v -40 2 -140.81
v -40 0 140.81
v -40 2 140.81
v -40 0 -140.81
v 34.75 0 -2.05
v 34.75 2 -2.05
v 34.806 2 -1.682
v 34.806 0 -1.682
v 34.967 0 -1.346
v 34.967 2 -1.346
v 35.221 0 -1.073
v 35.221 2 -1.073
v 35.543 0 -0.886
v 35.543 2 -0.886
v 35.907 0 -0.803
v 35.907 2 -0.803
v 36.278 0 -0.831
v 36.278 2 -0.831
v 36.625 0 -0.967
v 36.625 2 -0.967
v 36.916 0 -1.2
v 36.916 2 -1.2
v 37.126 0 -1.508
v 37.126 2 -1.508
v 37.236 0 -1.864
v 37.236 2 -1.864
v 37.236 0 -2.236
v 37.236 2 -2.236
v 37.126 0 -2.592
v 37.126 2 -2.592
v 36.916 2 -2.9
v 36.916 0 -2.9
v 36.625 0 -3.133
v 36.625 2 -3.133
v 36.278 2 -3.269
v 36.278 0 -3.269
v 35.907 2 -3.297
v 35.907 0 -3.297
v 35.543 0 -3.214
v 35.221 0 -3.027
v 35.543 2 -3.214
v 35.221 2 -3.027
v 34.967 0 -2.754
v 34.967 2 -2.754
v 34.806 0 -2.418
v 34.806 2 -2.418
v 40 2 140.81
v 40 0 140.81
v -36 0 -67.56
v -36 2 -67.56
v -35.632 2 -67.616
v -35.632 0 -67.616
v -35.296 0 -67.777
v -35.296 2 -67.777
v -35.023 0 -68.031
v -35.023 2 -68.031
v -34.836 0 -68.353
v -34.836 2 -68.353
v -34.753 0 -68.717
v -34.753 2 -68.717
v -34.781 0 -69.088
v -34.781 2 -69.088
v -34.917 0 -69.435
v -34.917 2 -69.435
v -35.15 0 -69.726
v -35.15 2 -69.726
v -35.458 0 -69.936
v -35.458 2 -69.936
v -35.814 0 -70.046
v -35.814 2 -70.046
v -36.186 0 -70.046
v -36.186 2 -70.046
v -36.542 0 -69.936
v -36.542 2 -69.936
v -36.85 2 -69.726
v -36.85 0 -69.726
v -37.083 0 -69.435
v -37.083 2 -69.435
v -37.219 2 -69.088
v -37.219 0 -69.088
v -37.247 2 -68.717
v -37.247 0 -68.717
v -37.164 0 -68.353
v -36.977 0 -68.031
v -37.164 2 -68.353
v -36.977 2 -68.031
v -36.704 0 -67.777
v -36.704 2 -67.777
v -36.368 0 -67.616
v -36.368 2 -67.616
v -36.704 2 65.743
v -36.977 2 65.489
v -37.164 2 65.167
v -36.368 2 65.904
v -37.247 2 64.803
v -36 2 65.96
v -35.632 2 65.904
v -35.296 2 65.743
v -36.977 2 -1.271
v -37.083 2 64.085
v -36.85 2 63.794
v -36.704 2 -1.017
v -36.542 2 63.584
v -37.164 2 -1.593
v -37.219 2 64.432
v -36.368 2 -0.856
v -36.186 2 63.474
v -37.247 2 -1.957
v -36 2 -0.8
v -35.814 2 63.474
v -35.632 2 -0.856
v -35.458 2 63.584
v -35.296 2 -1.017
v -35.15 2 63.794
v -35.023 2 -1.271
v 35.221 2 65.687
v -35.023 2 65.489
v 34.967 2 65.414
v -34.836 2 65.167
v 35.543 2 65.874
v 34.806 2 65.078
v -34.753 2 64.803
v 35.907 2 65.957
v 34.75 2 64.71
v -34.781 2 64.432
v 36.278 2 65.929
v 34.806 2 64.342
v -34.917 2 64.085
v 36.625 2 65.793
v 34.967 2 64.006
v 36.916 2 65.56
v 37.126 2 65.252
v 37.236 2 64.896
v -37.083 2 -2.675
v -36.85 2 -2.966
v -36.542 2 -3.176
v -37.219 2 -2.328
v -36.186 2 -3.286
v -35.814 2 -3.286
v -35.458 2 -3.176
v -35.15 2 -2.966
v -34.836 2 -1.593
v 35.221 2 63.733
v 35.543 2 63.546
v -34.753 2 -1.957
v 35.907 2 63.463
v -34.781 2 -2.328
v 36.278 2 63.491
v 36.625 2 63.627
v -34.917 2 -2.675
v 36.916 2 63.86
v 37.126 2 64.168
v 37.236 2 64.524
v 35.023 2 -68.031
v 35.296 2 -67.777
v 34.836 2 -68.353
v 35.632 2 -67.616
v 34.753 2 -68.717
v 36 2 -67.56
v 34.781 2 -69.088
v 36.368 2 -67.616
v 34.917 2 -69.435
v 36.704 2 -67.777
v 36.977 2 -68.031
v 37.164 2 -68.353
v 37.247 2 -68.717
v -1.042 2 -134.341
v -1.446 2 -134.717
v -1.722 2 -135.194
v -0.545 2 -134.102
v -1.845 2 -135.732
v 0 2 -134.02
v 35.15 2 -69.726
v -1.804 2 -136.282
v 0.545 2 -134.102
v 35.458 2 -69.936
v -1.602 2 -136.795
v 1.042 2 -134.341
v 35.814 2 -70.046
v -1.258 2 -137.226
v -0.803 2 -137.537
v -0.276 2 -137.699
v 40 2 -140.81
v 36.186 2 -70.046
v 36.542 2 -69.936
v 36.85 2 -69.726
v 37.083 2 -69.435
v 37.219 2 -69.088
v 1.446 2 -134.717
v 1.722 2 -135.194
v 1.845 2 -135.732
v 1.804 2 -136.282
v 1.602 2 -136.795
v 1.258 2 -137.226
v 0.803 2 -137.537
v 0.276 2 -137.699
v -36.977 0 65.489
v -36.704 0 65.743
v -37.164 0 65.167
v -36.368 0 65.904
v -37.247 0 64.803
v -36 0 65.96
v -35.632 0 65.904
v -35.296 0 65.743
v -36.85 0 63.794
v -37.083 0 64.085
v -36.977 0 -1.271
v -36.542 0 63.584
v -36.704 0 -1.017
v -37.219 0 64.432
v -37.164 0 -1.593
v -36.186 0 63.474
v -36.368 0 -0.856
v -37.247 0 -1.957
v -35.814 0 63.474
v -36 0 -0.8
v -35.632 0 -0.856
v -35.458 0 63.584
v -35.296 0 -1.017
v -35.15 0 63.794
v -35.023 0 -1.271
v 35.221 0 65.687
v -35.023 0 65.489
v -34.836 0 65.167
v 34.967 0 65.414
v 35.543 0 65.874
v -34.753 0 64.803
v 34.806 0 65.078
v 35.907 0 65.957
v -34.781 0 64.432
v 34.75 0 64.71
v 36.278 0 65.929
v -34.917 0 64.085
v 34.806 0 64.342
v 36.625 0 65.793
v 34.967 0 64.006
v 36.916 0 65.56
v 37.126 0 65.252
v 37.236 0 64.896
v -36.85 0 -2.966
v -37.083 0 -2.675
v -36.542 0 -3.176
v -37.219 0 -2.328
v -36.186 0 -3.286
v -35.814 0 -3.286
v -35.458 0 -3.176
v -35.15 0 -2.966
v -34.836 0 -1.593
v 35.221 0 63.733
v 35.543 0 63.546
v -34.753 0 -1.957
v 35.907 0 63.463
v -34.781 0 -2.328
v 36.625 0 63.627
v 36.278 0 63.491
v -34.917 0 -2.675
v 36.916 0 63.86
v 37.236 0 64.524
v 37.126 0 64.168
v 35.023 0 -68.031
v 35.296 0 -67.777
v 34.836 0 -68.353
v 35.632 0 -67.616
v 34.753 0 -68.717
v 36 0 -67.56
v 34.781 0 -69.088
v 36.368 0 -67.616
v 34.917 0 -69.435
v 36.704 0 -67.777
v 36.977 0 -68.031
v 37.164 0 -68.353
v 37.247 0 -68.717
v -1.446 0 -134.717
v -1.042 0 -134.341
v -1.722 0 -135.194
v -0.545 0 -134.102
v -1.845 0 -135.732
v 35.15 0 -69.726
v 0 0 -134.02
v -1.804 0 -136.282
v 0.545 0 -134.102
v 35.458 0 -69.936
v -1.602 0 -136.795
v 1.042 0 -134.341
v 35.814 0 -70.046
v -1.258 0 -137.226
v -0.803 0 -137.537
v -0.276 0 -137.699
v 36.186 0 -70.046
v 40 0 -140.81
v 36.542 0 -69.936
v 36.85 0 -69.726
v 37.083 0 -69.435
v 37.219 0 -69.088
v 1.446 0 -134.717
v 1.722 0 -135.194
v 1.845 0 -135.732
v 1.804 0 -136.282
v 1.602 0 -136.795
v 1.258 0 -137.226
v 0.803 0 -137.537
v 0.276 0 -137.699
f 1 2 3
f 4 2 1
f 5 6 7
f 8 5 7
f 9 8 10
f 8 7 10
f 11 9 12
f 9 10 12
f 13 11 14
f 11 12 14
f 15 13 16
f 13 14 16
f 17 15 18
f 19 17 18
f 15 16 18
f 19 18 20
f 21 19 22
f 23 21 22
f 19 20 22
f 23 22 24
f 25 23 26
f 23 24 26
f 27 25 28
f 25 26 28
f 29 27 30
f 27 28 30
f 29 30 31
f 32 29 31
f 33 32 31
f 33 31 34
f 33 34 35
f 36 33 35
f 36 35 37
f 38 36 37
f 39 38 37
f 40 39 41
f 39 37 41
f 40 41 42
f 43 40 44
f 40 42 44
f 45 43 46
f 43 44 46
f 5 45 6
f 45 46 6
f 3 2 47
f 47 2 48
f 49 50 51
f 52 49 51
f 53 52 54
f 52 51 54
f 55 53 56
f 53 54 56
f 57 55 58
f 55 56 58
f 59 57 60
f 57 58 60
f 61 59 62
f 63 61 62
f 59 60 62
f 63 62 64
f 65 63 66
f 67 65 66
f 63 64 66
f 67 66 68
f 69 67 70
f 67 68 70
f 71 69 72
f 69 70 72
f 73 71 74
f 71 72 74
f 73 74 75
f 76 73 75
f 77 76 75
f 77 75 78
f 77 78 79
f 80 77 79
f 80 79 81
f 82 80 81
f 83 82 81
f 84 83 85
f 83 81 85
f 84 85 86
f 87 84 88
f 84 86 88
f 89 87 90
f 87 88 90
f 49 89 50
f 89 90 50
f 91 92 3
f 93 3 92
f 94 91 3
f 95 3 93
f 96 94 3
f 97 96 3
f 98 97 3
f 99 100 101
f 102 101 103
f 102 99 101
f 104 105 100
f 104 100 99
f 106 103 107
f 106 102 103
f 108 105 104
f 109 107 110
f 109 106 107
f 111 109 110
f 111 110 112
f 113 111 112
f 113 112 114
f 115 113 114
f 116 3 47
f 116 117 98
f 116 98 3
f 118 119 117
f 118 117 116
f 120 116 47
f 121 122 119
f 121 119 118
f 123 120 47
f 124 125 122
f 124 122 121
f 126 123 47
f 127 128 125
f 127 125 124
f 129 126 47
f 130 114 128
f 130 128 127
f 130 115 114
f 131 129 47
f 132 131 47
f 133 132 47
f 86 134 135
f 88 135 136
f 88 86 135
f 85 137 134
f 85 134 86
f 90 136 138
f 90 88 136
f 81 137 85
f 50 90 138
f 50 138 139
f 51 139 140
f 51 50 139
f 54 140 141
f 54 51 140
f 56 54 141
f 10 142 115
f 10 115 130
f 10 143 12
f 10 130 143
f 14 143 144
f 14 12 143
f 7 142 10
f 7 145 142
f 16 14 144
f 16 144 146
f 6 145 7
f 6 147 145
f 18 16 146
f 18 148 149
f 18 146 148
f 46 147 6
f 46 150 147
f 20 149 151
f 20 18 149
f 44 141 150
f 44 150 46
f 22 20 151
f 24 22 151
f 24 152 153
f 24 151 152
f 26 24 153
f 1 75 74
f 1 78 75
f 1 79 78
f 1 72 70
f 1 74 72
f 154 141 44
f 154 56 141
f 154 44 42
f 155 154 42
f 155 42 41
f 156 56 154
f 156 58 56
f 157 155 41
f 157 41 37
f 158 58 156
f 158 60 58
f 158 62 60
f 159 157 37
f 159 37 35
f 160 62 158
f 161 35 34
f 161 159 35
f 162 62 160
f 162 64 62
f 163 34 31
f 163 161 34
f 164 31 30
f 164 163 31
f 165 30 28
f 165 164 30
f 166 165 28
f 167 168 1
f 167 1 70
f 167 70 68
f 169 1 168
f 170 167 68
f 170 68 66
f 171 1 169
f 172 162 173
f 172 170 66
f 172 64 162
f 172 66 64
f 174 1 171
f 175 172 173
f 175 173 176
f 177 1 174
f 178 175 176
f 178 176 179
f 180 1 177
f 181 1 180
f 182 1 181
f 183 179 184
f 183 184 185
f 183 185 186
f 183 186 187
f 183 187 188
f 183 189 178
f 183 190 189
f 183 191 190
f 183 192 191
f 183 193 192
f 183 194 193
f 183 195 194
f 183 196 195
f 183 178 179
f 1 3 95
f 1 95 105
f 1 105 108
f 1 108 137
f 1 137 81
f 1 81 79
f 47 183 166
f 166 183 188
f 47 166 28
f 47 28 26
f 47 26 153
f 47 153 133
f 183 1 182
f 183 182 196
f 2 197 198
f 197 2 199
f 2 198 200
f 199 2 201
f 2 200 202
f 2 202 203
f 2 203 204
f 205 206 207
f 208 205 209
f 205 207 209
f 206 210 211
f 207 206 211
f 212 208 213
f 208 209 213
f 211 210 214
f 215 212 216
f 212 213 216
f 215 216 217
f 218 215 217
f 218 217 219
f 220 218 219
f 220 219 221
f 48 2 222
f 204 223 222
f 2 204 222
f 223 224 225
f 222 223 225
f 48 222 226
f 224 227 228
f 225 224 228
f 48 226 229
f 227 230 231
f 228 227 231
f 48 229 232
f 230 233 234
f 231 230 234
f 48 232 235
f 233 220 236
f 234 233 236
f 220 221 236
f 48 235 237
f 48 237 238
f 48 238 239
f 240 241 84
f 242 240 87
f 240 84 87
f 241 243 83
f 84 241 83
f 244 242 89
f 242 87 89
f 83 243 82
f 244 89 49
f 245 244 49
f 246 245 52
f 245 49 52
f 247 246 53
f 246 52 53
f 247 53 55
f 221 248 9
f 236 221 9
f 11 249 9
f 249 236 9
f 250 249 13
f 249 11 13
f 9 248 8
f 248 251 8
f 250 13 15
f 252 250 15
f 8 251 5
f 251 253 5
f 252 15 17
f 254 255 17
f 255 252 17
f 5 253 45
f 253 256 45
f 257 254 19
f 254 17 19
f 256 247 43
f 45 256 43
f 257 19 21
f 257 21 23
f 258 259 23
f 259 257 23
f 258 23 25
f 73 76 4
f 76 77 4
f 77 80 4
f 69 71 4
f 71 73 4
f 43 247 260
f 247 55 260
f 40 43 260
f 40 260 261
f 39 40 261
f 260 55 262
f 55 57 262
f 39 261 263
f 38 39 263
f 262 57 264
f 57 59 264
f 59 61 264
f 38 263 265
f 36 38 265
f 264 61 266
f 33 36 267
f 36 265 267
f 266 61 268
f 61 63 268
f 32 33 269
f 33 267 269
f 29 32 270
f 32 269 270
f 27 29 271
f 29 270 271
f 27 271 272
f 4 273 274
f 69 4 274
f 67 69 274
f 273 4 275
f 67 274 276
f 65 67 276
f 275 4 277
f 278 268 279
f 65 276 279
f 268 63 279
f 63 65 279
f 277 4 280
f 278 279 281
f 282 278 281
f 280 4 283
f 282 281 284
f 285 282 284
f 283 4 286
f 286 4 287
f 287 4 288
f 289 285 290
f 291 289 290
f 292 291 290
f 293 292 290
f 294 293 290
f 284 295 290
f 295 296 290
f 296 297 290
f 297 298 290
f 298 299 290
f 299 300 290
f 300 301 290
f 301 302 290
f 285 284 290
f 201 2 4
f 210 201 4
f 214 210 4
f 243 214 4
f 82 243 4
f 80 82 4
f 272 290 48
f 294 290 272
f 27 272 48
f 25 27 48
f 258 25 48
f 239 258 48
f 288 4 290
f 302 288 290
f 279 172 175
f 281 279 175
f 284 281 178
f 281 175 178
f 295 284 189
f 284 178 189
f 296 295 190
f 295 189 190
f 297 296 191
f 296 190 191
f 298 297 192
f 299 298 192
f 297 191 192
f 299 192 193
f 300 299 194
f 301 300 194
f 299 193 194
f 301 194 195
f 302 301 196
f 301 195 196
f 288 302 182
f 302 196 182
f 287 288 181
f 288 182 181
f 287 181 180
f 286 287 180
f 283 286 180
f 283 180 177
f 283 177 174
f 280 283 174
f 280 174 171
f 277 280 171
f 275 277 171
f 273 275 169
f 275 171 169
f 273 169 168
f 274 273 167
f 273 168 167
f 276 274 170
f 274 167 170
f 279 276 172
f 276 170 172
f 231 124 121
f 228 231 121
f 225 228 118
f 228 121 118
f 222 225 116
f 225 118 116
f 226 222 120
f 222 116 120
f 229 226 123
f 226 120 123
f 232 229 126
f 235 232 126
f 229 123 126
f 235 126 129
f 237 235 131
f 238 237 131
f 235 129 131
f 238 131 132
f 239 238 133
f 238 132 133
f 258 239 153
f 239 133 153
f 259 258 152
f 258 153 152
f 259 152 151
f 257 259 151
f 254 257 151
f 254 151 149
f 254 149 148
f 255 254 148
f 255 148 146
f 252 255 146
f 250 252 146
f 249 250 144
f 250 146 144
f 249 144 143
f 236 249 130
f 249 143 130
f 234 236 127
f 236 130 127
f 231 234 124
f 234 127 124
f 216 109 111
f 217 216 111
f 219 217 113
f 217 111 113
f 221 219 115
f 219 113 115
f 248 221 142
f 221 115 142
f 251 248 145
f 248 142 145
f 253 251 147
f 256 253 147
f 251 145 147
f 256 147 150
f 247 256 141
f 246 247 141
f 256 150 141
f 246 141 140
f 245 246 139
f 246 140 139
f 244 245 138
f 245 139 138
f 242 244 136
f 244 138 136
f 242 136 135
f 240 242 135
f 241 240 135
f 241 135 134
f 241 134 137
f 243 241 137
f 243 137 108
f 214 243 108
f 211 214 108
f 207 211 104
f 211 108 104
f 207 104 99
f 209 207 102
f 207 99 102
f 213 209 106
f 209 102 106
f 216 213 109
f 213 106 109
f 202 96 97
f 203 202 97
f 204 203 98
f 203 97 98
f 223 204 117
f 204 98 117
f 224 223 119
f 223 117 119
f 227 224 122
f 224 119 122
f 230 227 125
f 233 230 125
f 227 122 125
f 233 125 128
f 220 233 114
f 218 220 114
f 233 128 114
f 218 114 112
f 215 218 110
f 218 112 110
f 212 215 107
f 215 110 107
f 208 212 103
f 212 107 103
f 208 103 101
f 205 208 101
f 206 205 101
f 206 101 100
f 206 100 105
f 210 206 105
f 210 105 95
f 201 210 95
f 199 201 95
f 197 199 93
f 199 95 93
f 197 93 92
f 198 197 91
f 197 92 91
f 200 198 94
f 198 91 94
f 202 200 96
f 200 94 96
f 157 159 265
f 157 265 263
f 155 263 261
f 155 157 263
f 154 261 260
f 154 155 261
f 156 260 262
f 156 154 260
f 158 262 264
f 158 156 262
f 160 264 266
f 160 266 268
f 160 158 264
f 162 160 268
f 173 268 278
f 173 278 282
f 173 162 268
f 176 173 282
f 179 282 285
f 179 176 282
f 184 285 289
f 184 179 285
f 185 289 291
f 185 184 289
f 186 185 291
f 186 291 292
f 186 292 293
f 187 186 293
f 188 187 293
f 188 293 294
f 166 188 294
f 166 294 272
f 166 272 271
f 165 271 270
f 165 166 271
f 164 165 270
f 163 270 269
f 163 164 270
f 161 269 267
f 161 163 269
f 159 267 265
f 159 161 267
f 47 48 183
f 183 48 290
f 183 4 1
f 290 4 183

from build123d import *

# Parameters (mm, degrees)
SKETCH1_W               = 80
SKETCH1_H               = 281.62
BOSS_EXTRUDE1_DEPTH     = 2
SKETCH2_R               = 1.85
CUT_EXTRUDE1_DEPTH      = 2
SKETCH3_R               = 1.25
CUT_EXTRUDE2_DEPTH      = 2
LPATTERN1_COUNT         = 3
LPATTERN1_PITCH         = 66.76
MIRROR1_COPY_1_SKETCH_R = 1.25
MIRROR1_COPY_1_DEPTH    = 2
MIRROR1_COPY_2_SKETCH_R = 1.25
MIRROR1_COPY_2_DEPTH    = 2


with BuildPart() as part:
    # Sketch1 → Boss-Extrude1 (new body)
    with BuildSketch(Plane(origin=(0, 0, 0), x_dir=(1, 0, 0), z_dir=(0, 1, 0))):
        Rectangle(SKETCH1_W, SKETCH1_H)
    extrude(amount=BOSS_EXTRUDE1_DEPTH)

    # Sketch2 → Cut-Extrude1 (cut)
    with BuildSketch(Plane(origin=(0, 2, 0), x_dir=(1, 0, 0), z_dir=(0, 1, 0))):
        with Locations(Location((0, 135.87, 0), (0, 0, 270))):
            Circle(SKETCH2_R)
    extrude(amount=-CUT_EXTRUDE1_DEPTH, mode=Mode.SUBTRACT)

    # Sketch3 → Cut-Extrude2 (cut)
    with BuildSketch(Plane(origin=(0, 2, 0), x_dir=(1, 0, 0), z_dir=(0, 1, 0))):
        with Locations(Location((-36, 68.81, 0), (0, 0, 270))):
            Circle(SKETCH3_R)
    cut_extrude2 = extrude(amount=-CUT_EXTRUDE2_DEPTH, mode=Mode.SUBTRACT)

    # LPattern1: Cut-Extrude2 ×3
    with Locations(*[(0, 0, i * LPATTERN1_PITCH) for i in range(1, LPATTERN1_COUNT)]):
        add(cut_extrude2, mode=Mode.SUBTRACT)

    # Mirror1: Cut-Extrude2 across plane
    add(cut_extrude2.mirror(Plane(origin=(0, 0, 0), x_dir=(0, 0, 1), z_dir=(1, 0, 0))), mode=Mode.SUBTRACT)

    # Mirror1 copy 1 sketch → Mirror1 copy 1 (cut)
    with BuildSketch(Plane(origin=(0, 2, 66.76), x_dir=(-1, 0, 0), z_dir=(0, 1, 0))):
        with Locations((-36, -68.81)):
            Circle(MIRROR1_COPY_1_SKETCH_R)
    extrude(amount=-MIRROR1_COPY_1_DEPTH, mode=Mode.SUBTRACT)

    # Mirror1 copy 2 sketch → Mirror1 copy 2 (cut)
    with BuildSketch(Plane(origin=(0, 2, 133.52), x_dir=(-1, 0, 0), z_dir=(0, 1, 0))):
        with Locations((-36, -68.81)):
            Circle(MIRROR1_COPY_2_SKETCH_R)
    extrude(amount=-MIRROR1_COPY_2_DEPTH, mode=Mode.SUBTRACT)


solid = part.part
